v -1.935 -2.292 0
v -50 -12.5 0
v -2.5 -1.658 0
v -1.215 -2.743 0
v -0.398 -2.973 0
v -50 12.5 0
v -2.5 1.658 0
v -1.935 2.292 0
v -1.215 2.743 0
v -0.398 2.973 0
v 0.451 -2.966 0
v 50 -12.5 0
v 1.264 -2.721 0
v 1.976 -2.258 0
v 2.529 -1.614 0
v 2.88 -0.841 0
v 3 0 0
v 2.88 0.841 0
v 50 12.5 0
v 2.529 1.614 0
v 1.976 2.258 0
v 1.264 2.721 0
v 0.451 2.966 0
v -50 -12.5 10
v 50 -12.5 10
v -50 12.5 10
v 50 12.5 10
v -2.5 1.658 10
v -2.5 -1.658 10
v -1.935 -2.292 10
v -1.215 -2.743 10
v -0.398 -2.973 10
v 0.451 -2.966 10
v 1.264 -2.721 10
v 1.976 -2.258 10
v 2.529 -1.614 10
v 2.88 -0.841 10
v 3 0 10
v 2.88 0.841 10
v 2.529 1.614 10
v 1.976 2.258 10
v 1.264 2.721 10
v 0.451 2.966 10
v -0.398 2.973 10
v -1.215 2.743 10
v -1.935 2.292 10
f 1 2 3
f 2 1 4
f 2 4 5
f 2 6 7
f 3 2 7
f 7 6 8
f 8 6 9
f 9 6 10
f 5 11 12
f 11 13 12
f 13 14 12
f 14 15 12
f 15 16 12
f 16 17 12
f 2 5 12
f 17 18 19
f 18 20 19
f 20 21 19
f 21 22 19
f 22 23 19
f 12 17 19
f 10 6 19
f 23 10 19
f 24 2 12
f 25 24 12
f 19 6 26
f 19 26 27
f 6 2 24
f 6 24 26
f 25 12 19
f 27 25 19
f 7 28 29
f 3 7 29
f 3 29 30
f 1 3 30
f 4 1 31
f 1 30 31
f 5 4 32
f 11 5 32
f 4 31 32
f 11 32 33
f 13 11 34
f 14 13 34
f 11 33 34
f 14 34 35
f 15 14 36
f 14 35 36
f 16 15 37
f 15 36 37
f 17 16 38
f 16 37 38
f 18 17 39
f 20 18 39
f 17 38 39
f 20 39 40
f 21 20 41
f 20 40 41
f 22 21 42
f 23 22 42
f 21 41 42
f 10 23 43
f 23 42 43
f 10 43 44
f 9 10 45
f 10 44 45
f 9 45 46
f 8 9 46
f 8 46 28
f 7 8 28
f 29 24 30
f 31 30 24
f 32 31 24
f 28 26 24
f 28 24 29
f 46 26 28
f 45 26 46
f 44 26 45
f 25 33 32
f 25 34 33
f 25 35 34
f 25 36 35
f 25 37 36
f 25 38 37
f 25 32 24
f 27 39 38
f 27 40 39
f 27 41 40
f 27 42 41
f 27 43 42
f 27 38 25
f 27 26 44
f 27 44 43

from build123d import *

# Parameters (mm, degrees)
SKETCH1_W           = 100
SKETCH1_H           = 25
BOSS_EXTRUDE1_DEPTH = 10
CUT_EXTRUDE1_DEPTH  = 10


with BuildPart() as part:
    # Sketch1 → Boss-Extrude1 (new body)
    with BuildSketch(Plane.XY):
        Rectangle(SKETCH1_W, SKETCH1_H)
    extrude(amount=BOSS_EXTRUDE1_DEPTH)

    # Sketch2 → Cut-Extrude1 (cut)
    with BuildSketch(Plane.XY.offset(10)):
        with BuildLine():
            Line((-2.5, 1.658312395), (-2.5, -1.658312395))
            ThreePointArc((-2.5, -1.658312395), (3, 0), (-2.5, 1.658312395))
        make_face()
    extrude(amount=-CUT_EXTRUDE1_DEPTH, mode=Mode.SUBTRACT)


solid = part.part
